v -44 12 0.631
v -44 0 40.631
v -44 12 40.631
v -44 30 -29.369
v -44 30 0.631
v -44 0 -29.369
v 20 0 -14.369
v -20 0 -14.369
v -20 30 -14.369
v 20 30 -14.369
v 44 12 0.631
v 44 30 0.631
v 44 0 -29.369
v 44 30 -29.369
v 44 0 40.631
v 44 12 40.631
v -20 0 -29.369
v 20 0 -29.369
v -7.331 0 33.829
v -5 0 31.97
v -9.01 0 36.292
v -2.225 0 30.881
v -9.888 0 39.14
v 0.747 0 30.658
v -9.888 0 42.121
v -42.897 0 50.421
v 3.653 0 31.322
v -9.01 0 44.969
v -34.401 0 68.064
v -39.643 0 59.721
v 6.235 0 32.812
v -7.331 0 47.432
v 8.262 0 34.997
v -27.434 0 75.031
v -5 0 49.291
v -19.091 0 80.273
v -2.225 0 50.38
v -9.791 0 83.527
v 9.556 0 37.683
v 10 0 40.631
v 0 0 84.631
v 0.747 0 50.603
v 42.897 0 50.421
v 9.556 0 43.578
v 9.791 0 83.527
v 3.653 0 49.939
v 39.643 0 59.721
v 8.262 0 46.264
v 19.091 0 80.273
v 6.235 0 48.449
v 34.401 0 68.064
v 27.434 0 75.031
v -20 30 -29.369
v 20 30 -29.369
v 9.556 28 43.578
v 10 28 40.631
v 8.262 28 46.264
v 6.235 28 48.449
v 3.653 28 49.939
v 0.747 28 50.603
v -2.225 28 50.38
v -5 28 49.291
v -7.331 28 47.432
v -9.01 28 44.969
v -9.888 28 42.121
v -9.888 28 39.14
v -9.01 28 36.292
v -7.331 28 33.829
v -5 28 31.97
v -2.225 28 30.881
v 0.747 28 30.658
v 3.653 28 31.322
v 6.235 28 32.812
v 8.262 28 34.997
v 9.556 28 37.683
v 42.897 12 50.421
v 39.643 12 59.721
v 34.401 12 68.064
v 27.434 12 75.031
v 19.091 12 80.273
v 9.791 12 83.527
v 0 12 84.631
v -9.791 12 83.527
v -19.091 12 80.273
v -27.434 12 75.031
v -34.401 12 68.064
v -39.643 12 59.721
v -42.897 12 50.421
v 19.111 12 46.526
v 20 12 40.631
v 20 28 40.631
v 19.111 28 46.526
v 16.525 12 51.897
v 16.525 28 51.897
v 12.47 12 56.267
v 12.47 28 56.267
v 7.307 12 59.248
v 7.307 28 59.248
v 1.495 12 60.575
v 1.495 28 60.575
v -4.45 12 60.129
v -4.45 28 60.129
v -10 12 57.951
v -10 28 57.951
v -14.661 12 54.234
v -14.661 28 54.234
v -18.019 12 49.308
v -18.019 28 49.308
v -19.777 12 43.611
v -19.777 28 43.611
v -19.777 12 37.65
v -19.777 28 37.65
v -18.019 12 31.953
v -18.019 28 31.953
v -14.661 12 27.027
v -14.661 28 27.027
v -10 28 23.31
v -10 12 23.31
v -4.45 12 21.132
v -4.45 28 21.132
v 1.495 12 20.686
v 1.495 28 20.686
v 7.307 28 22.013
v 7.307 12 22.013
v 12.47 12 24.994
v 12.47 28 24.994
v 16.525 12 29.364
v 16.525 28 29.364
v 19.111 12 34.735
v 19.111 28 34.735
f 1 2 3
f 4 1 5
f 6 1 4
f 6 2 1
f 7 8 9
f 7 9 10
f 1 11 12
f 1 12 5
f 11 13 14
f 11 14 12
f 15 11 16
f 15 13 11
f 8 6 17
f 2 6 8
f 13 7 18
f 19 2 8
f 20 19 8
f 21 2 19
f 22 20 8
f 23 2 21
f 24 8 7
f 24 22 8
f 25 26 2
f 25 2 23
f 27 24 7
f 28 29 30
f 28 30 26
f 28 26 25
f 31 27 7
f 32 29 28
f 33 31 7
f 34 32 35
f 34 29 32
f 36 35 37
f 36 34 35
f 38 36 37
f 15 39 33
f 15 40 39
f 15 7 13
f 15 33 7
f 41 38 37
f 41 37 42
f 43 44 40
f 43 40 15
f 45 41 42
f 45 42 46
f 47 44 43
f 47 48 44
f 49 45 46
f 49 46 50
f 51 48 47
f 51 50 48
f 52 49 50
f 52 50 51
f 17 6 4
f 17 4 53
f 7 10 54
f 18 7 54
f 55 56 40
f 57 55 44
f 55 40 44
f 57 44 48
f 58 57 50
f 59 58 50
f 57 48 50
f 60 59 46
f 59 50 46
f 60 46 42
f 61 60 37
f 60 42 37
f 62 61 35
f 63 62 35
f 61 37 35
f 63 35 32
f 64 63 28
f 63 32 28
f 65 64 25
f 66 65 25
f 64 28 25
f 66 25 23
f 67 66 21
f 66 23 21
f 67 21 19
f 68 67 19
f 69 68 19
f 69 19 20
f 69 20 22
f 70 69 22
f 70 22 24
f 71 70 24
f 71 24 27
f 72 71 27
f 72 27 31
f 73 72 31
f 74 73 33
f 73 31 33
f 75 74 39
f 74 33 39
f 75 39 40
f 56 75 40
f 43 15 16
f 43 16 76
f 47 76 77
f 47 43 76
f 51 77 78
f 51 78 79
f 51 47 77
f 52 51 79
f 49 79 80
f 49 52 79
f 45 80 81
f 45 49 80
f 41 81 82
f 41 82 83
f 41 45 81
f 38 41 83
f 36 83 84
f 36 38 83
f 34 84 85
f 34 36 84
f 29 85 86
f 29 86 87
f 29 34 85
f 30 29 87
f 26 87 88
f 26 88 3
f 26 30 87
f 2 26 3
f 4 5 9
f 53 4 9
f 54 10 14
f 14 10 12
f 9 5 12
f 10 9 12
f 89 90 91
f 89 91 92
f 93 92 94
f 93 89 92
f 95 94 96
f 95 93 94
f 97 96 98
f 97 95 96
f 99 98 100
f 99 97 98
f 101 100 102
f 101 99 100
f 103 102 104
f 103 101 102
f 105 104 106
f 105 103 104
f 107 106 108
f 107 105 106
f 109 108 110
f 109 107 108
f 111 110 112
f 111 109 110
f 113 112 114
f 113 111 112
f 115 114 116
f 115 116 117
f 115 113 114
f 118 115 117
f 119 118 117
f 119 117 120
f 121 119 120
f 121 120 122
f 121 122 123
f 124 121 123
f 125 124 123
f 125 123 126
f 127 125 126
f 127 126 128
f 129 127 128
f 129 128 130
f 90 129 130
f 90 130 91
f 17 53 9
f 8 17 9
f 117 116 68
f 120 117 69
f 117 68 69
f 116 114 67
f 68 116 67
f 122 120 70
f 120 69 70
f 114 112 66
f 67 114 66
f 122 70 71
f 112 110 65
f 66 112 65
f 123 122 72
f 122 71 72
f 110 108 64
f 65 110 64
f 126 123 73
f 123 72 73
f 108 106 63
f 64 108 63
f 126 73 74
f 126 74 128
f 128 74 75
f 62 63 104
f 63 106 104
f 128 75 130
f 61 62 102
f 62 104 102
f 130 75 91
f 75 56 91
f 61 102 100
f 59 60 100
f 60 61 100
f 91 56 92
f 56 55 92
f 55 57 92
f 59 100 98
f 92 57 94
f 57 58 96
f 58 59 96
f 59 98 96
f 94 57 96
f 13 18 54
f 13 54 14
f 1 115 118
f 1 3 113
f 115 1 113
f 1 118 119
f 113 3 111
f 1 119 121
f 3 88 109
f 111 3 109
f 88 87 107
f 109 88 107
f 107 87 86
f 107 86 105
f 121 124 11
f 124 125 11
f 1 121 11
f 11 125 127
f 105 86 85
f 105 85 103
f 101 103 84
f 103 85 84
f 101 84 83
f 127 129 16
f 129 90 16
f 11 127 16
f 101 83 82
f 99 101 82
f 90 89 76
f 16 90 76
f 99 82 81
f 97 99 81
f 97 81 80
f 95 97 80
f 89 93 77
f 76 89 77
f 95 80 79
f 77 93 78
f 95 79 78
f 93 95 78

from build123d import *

# Parameters (mm, degrees)
F1_DEPTH = 30
F0_R     = 20
F2_DEPTH = 12
F0_R_2   = 10
F3_DEPTH = 28


with BuildPart() as f1:
    # F0 (on Front) → F1 (new body)
    with BuildSketch(Plane.XZ):
        Polygon((-44, 0.63053), (-44, -29.36947), (-20, -29.36947), (-20, -14.36947), (20, -14.36947), (20, -29.36947), (44, -29.36947), (44, 0.63053), align=None)
    extrude(amount=-F1_DEPTH)

    # F0 (on Front) → F2 (join)
    with BuildSketch(Plane.XZ):
        Polygon((-44, 0.63053), (-44, -29.36947), (-20, -29.36947), (-20, -14.36947), (20, -14.36947), (20, -29.36947), (44, -29.36947), (44, 0.63053), align=None)
        with BuildLine():
            Line((-44, 40.63053), (-44, 0.63053))
            Line((-44, 0.63053), (44, 0.63053))
            Line((44, 0.63053), (44, 40.63053))
            ThreePointArc((44, 40.63053), (0, 84.63053), (-44, 40.63053))
        make_face()
        with Locations((0, 40.63053)):
            Circle(F0_R, mode=Mode.SUBTRACT)
    extrude(amount=-F2_DEPTH)

    # F0 (on Front) → F3 (join)
    with BuildSketch(Plane.XZ):
        with Locations((0, 40.63053)):
            Circle(F0_R)
        with Locations((0, 40.63053)):
            Circle(F0_R_2, mode=Mode.SUBTRACT)
    extrude(amount=-F3_DEPTH)


solid = f1.part
